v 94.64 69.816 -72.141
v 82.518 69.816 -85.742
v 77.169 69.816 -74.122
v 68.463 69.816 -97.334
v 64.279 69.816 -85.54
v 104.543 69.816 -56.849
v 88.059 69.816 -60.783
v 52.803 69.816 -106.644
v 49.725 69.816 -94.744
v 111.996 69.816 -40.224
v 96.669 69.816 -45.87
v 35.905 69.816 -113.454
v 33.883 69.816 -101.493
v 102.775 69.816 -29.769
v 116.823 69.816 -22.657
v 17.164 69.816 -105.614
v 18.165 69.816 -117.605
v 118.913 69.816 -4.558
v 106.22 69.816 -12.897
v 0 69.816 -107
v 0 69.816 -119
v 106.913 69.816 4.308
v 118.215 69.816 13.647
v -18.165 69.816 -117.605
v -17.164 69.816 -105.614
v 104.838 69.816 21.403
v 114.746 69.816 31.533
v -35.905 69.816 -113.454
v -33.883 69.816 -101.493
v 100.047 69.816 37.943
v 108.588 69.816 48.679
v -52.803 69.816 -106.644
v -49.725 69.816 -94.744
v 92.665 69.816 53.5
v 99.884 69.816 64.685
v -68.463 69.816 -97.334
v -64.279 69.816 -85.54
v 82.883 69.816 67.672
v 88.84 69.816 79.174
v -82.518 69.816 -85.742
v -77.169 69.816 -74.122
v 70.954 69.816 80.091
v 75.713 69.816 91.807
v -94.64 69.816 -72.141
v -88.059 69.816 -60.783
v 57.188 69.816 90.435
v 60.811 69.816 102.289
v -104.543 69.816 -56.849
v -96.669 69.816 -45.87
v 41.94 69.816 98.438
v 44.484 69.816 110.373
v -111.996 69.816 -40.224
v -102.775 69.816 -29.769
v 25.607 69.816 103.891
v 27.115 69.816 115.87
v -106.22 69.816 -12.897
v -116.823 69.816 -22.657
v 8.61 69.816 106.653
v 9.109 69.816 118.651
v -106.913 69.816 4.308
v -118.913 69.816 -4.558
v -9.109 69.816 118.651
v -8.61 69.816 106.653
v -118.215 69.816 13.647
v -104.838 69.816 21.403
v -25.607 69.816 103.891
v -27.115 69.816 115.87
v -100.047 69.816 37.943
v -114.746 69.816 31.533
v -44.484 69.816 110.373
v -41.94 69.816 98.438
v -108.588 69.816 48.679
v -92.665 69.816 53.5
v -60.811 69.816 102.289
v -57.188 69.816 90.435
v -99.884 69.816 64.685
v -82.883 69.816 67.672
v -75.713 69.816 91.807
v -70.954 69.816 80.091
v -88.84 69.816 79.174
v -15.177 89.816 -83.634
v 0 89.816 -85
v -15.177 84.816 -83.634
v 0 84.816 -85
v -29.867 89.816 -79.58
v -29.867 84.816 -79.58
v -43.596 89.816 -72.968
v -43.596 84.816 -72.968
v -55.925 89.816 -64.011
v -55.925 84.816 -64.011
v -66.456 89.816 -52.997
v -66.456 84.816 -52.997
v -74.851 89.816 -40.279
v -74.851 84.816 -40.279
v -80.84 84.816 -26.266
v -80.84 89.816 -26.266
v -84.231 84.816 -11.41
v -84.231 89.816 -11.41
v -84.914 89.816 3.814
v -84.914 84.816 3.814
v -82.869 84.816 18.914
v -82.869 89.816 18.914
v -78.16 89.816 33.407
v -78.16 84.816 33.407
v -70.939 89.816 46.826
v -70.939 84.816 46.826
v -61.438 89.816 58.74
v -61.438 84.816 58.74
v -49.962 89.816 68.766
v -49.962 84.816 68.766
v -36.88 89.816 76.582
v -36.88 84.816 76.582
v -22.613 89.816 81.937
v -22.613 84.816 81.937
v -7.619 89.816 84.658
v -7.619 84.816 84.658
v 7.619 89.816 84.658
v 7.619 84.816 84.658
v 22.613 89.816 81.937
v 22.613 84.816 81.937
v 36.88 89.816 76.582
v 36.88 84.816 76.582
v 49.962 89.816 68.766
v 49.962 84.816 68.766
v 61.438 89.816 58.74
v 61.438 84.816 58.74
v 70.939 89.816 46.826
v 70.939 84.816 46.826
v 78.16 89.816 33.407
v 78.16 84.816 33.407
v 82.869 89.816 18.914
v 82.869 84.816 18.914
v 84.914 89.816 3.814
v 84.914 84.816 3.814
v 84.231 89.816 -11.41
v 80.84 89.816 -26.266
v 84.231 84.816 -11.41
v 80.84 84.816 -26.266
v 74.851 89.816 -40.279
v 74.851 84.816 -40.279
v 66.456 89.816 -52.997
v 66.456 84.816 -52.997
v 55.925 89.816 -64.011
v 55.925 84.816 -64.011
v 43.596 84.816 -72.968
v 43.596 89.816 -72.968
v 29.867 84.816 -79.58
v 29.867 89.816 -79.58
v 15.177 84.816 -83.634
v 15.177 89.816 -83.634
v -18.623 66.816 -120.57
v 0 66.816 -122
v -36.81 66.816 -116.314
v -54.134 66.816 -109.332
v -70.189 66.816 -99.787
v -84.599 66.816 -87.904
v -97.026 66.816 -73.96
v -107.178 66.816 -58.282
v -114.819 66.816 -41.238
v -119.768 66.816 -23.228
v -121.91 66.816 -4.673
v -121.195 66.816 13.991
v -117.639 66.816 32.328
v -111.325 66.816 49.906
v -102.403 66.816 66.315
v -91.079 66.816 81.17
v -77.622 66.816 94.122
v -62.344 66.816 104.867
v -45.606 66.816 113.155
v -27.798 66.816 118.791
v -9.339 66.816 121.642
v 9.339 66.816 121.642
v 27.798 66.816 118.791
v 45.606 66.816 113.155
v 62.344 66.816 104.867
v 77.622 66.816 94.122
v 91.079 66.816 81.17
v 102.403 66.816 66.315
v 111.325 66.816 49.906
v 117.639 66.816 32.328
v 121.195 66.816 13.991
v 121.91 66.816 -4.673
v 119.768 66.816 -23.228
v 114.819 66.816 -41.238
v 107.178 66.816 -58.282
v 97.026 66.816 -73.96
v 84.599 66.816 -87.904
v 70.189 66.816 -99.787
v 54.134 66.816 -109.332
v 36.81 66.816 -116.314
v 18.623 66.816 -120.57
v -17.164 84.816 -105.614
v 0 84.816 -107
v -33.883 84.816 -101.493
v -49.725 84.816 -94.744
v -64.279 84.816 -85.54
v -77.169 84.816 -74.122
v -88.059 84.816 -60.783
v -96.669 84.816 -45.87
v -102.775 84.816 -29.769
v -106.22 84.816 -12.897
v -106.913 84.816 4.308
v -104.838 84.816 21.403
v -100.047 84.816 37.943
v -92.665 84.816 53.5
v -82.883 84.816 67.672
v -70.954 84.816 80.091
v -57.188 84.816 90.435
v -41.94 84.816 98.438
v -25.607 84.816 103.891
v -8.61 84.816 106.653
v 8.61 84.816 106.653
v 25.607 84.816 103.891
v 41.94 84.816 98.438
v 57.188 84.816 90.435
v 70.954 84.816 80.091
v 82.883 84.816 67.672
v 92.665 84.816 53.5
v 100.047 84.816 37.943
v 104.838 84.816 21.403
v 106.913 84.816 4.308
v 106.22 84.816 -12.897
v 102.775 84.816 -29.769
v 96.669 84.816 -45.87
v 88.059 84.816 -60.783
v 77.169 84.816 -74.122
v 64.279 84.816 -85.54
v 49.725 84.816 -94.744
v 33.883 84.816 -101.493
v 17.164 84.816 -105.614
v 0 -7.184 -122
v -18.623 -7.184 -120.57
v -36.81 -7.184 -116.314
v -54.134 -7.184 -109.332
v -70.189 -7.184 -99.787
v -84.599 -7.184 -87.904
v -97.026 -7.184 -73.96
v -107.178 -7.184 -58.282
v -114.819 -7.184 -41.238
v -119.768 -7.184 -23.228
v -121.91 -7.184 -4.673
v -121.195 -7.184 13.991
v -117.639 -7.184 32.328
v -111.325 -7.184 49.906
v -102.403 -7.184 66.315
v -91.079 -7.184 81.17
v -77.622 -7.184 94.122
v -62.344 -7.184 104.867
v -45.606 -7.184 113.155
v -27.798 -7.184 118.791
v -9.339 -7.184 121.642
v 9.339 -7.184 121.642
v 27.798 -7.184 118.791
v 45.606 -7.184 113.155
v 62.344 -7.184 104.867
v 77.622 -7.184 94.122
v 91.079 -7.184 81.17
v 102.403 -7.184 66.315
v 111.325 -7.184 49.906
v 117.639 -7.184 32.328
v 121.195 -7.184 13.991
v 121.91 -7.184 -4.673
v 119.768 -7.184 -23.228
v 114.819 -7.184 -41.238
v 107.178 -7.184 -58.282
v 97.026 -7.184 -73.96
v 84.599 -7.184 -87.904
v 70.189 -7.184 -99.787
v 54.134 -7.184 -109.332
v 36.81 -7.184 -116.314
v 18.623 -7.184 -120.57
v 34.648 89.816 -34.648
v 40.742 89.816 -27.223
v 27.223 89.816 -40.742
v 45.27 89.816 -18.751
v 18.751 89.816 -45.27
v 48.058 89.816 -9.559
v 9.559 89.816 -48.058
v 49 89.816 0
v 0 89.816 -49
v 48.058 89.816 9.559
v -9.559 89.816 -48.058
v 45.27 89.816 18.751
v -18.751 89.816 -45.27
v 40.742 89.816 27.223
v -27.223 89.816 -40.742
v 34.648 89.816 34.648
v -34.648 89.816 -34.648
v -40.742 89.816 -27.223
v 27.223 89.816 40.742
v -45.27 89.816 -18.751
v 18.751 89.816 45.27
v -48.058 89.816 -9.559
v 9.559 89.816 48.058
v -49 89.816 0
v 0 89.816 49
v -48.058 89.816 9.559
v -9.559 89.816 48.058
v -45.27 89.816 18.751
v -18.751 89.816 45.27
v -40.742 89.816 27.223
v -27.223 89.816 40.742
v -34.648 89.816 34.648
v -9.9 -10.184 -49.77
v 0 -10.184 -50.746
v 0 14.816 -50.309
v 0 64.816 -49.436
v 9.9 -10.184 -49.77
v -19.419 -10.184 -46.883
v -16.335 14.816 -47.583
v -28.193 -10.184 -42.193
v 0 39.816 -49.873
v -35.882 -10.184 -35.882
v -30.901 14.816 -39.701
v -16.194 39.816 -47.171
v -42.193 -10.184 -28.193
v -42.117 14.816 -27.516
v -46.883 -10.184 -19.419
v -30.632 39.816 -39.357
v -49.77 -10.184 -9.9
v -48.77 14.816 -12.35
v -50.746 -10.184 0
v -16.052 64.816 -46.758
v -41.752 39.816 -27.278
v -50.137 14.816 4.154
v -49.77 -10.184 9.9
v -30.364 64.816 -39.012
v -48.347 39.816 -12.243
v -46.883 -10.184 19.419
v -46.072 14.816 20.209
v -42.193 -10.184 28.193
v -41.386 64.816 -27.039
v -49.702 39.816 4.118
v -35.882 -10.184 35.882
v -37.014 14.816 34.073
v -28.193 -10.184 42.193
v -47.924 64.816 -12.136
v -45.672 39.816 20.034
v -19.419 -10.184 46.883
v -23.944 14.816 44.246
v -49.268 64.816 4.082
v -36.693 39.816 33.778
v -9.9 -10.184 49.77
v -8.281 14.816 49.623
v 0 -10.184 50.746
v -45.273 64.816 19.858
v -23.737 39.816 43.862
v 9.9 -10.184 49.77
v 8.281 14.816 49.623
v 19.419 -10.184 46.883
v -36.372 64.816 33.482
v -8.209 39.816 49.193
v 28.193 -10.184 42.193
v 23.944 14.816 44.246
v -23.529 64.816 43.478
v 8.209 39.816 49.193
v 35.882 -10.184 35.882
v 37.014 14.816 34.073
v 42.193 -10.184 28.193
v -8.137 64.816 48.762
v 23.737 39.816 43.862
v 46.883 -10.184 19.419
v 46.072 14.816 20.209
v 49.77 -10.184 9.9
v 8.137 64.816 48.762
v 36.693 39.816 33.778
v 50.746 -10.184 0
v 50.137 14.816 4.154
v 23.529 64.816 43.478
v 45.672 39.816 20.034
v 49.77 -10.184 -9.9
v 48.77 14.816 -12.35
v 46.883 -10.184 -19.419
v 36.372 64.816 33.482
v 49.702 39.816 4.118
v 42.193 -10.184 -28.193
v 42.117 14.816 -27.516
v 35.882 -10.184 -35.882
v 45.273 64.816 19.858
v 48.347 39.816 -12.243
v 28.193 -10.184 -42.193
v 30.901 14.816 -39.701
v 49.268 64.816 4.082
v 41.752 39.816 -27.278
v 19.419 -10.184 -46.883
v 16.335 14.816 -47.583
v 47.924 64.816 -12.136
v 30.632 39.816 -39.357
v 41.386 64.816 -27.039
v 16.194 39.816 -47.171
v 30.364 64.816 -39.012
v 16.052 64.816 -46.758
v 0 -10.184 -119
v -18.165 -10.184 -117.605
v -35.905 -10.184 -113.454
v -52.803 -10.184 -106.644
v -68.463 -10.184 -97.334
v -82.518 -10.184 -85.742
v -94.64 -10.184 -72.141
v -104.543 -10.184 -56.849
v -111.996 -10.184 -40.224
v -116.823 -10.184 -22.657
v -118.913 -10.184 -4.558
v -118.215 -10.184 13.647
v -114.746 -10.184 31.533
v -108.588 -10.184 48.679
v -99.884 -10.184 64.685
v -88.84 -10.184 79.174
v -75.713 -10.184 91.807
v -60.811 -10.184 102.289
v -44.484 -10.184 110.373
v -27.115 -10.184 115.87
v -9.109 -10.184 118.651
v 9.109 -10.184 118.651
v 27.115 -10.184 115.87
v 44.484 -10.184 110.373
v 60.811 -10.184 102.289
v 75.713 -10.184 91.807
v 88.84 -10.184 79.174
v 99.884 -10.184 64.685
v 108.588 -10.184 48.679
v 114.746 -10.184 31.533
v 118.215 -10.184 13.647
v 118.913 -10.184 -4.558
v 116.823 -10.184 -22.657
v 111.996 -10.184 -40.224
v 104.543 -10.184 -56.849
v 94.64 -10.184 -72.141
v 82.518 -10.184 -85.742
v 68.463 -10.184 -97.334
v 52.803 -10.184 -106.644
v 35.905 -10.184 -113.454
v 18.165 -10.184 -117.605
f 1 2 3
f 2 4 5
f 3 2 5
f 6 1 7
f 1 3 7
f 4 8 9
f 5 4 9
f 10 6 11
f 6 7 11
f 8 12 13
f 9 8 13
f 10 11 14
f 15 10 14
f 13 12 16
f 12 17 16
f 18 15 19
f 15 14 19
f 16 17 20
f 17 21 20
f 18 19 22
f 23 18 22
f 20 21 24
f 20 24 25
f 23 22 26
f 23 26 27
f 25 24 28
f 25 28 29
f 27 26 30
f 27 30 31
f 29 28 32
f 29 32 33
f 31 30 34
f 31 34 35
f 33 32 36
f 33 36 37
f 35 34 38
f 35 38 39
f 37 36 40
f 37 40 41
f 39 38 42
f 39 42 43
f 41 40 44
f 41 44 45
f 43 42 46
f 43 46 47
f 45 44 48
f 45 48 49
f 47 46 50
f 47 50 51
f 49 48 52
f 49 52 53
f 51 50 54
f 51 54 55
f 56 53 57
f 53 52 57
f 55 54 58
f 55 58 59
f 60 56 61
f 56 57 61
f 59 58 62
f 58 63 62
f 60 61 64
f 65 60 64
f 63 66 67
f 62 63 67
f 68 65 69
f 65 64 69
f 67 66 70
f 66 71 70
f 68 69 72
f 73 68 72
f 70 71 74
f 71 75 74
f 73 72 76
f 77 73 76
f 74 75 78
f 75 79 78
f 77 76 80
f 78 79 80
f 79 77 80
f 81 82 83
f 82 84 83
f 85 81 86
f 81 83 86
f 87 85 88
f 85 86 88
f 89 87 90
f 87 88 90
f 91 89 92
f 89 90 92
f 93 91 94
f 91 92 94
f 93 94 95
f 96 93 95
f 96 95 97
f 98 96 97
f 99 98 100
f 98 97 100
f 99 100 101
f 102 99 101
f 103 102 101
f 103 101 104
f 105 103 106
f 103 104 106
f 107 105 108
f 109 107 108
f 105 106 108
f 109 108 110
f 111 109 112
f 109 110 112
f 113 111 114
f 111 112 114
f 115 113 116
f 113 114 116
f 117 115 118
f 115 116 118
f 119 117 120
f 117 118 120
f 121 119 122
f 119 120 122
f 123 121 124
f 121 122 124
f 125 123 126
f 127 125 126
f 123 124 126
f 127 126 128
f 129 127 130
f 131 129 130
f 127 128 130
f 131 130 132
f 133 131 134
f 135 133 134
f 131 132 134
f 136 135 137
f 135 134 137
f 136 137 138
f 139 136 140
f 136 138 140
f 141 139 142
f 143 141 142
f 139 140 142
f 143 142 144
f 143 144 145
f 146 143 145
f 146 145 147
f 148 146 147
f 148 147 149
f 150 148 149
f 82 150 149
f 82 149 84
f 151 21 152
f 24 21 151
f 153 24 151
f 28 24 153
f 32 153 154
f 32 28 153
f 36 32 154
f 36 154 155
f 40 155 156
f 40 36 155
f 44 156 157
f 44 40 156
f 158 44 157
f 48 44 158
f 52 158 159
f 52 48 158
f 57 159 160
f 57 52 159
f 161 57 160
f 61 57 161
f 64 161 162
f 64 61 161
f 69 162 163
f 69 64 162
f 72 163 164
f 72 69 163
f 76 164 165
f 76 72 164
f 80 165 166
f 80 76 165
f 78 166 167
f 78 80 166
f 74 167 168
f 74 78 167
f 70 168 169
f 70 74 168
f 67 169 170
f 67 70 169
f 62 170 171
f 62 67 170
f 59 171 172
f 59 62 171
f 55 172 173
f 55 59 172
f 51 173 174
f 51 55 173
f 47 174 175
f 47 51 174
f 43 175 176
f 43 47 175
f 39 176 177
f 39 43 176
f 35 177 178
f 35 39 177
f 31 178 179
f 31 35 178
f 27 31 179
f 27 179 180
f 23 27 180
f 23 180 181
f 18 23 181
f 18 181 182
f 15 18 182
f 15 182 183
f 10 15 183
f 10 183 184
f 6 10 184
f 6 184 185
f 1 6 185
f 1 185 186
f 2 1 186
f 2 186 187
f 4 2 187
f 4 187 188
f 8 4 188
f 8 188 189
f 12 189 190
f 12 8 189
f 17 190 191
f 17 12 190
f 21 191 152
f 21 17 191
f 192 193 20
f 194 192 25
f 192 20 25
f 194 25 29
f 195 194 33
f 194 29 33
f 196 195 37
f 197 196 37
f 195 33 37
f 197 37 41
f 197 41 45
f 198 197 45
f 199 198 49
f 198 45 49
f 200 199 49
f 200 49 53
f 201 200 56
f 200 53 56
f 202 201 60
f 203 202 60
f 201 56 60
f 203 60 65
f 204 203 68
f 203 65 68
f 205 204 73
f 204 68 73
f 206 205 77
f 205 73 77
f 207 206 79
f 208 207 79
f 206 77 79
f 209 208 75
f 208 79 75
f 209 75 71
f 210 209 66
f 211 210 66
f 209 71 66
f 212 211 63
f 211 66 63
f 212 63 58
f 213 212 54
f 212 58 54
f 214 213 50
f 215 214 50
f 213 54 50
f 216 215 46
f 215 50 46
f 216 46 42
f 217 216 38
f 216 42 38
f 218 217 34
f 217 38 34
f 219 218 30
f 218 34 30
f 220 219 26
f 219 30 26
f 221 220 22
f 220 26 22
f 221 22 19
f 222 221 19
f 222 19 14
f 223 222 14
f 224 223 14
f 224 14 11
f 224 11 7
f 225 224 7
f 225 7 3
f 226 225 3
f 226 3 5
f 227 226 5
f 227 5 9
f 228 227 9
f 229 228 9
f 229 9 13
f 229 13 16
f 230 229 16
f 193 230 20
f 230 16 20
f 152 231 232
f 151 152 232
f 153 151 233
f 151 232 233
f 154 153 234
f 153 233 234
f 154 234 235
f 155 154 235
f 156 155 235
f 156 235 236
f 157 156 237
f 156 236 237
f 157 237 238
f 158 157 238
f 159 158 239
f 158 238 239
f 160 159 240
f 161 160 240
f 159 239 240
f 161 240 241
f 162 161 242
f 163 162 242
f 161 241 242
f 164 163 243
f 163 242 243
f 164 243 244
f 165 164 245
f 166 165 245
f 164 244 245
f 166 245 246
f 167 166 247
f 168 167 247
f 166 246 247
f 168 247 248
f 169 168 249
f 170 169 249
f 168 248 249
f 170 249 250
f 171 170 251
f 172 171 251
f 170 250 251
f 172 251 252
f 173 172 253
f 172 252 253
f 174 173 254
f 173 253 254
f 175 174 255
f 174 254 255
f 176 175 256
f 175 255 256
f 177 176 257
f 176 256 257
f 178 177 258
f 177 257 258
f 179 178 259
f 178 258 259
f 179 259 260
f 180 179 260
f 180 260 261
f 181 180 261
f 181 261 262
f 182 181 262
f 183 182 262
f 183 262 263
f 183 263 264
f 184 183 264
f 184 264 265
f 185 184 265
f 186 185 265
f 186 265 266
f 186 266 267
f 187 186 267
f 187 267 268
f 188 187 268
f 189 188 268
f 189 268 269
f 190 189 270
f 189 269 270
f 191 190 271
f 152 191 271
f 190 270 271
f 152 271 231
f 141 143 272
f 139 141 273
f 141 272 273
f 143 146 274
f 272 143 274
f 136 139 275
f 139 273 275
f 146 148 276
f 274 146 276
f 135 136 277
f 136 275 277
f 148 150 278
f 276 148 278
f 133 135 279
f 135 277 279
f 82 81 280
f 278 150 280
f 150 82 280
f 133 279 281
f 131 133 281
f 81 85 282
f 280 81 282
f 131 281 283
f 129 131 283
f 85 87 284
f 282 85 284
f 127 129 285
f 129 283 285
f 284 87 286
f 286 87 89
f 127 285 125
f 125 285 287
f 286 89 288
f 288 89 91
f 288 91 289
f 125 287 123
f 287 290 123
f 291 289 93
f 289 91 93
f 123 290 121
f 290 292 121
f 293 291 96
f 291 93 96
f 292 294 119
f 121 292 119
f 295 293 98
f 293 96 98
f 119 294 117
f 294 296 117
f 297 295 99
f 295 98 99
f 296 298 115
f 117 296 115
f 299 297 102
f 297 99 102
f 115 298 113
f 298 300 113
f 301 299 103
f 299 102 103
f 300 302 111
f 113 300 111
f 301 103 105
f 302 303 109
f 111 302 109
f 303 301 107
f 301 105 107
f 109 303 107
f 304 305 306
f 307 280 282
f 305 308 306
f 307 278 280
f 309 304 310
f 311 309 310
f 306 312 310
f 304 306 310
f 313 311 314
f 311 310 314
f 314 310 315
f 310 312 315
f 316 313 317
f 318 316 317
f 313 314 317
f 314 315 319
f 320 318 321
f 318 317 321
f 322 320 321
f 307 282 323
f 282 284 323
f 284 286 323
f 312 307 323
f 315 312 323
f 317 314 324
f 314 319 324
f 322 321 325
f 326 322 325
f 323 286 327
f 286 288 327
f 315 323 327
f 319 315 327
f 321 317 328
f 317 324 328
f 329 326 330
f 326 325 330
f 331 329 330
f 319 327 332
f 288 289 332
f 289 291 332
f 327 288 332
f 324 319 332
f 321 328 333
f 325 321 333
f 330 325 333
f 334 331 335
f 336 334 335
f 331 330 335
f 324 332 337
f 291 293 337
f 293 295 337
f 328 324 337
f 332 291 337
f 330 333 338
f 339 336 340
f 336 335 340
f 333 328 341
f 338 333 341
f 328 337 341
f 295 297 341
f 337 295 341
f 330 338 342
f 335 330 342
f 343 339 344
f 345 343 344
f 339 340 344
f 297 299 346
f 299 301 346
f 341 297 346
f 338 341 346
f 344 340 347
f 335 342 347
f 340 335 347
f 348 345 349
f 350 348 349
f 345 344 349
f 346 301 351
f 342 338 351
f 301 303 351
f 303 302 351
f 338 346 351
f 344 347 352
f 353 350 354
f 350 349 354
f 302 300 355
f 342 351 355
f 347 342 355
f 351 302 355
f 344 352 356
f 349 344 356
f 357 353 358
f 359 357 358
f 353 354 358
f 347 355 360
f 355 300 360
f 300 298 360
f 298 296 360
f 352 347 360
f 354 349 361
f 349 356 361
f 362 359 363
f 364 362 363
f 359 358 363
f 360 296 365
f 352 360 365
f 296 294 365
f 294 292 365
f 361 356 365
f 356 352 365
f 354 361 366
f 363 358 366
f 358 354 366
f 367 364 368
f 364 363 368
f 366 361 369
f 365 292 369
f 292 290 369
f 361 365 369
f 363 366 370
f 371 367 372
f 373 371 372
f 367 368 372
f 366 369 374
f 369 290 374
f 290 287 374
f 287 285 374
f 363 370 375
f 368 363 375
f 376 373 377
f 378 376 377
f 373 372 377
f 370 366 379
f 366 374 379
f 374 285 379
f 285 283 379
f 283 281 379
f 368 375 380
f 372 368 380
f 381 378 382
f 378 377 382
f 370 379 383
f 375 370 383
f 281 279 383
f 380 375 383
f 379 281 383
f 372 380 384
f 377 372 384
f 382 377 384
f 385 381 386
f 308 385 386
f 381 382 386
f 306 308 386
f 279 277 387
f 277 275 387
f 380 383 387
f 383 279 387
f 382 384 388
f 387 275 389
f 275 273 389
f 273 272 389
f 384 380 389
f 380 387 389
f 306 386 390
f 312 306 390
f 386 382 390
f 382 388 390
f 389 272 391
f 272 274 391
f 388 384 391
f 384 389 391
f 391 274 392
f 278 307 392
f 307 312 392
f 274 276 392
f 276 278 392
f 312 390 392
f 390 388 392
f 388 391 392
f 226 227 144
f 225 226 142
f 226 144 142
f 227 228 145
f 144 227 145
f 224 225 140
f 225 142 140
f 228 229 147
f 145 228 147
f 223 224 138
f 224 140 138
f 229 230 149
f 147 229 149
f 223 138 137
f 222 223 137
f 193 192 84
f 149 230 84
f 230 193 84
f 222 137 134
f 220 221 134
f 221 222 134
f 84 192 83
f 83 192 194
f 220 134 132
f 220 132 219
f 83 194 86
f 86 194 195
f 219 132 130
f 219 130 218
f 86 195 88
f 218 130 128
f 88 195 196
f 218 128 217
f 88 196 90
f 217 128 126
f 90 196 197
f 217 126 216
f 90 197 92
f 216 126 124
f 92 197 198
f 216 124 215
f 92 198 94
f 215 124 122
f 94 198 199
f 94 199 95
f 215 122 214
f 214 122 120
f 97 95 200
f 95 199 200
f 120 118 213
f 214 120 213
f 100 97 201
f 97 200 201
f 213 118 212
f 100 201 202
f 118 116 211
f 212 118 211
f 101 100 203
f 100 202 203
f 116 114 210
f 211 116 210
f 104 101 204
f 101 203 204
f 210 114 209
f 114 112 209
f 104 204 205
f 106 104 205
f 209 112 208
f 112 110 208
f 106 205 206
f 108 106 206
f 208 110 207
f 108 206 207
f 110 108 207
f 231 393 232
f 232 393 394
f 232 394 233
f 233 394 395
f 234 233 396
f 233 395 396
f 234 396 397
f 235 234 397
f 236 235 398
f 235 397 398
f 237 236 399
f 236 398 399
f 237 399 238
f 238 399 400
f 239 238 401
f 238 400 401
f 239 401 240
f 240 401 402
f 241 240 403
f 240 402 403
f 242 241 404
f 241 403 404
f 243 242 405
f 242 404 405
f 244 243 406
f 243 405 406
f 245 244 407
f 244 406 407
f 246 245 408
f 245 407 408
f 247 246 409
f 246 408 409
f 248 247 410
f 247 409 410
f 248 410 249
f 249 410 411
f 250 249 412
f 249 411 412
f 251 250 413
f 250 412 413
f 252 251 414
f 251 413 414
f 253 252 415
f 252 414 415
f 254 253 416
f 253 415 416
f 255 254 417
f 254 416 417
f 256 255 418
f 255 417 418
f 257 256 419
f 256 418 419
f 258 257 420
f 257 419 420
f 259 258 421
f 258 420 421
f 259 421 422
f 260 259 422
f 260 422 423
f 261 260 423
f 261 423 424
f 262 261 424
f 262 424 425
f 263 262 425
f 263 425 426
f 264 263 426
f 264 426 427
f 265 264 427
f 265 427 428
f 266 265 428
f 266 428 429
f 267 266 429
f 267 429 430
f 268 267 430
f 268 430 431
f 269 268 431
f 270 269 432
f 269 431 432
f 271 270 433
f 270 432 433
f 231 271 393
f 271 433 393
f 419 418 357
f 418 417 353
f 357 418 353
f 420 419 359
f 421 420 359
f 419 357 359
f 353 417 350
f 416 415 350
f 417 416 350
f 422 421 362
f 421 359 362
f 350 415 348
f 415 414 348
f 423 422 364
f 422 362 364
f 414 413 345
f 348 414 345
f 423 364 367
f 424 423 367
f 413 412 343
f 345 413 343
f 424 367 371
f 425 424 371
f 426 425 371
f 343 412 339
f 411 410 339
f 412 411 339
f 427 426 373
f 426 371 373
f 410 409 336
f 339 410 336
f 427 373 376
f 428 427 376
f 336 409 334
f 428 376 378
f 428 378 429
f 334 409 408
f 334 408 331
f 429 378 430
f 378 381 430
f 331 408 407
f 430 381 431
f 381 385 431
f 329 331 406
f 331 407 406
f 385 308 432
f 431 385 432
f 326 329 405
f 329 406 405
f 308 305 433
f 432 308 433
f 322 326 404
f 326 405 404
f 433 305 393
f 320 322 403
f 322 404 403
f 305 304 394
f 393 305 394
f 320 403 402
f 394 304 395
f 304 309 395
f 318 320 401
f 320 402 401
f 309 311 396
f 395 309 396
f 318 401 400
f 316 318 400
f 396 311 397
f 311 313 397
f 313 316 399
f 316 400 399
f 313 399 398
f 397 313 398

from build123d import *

# Parameters (mm, degrees)
SFAZOWANIE2_SIZE = 3


with BuildPart() as part:
    # Szkic1 → Obrót1 (revolve)
    with BuildSketch(Plane.XY, mode=Mode.PRIVATE) as obr_t1_sk:
        Polygon((-122, 69.81557254), (-122, -10.18442746), (-50.745506493, -10.18442746), (-49, 89.81557254), (-85, 89.81557254), (-85, 84.81557254), (-107, 84.81557254), (-107, 69.81557254), align=None)
    revolve(obr_t1_sk.sketch.rotate(Axis((0, 0, 0), (0, 1, 0)), 270), axis=Axis((0, 0, 0), (0, 1, 0)))

    # Sfazowanie2
    sfazowanie2_edges = [part.edges().sort_by_distance(p)[0] for p in [
        (0, -10.18442746, 122),
        (0, 69.81557254, 122),
    ]]
    chamfer(sfazowanie2_edges, length=SFAZOWANIE2_SIZE)


solid = part.part
